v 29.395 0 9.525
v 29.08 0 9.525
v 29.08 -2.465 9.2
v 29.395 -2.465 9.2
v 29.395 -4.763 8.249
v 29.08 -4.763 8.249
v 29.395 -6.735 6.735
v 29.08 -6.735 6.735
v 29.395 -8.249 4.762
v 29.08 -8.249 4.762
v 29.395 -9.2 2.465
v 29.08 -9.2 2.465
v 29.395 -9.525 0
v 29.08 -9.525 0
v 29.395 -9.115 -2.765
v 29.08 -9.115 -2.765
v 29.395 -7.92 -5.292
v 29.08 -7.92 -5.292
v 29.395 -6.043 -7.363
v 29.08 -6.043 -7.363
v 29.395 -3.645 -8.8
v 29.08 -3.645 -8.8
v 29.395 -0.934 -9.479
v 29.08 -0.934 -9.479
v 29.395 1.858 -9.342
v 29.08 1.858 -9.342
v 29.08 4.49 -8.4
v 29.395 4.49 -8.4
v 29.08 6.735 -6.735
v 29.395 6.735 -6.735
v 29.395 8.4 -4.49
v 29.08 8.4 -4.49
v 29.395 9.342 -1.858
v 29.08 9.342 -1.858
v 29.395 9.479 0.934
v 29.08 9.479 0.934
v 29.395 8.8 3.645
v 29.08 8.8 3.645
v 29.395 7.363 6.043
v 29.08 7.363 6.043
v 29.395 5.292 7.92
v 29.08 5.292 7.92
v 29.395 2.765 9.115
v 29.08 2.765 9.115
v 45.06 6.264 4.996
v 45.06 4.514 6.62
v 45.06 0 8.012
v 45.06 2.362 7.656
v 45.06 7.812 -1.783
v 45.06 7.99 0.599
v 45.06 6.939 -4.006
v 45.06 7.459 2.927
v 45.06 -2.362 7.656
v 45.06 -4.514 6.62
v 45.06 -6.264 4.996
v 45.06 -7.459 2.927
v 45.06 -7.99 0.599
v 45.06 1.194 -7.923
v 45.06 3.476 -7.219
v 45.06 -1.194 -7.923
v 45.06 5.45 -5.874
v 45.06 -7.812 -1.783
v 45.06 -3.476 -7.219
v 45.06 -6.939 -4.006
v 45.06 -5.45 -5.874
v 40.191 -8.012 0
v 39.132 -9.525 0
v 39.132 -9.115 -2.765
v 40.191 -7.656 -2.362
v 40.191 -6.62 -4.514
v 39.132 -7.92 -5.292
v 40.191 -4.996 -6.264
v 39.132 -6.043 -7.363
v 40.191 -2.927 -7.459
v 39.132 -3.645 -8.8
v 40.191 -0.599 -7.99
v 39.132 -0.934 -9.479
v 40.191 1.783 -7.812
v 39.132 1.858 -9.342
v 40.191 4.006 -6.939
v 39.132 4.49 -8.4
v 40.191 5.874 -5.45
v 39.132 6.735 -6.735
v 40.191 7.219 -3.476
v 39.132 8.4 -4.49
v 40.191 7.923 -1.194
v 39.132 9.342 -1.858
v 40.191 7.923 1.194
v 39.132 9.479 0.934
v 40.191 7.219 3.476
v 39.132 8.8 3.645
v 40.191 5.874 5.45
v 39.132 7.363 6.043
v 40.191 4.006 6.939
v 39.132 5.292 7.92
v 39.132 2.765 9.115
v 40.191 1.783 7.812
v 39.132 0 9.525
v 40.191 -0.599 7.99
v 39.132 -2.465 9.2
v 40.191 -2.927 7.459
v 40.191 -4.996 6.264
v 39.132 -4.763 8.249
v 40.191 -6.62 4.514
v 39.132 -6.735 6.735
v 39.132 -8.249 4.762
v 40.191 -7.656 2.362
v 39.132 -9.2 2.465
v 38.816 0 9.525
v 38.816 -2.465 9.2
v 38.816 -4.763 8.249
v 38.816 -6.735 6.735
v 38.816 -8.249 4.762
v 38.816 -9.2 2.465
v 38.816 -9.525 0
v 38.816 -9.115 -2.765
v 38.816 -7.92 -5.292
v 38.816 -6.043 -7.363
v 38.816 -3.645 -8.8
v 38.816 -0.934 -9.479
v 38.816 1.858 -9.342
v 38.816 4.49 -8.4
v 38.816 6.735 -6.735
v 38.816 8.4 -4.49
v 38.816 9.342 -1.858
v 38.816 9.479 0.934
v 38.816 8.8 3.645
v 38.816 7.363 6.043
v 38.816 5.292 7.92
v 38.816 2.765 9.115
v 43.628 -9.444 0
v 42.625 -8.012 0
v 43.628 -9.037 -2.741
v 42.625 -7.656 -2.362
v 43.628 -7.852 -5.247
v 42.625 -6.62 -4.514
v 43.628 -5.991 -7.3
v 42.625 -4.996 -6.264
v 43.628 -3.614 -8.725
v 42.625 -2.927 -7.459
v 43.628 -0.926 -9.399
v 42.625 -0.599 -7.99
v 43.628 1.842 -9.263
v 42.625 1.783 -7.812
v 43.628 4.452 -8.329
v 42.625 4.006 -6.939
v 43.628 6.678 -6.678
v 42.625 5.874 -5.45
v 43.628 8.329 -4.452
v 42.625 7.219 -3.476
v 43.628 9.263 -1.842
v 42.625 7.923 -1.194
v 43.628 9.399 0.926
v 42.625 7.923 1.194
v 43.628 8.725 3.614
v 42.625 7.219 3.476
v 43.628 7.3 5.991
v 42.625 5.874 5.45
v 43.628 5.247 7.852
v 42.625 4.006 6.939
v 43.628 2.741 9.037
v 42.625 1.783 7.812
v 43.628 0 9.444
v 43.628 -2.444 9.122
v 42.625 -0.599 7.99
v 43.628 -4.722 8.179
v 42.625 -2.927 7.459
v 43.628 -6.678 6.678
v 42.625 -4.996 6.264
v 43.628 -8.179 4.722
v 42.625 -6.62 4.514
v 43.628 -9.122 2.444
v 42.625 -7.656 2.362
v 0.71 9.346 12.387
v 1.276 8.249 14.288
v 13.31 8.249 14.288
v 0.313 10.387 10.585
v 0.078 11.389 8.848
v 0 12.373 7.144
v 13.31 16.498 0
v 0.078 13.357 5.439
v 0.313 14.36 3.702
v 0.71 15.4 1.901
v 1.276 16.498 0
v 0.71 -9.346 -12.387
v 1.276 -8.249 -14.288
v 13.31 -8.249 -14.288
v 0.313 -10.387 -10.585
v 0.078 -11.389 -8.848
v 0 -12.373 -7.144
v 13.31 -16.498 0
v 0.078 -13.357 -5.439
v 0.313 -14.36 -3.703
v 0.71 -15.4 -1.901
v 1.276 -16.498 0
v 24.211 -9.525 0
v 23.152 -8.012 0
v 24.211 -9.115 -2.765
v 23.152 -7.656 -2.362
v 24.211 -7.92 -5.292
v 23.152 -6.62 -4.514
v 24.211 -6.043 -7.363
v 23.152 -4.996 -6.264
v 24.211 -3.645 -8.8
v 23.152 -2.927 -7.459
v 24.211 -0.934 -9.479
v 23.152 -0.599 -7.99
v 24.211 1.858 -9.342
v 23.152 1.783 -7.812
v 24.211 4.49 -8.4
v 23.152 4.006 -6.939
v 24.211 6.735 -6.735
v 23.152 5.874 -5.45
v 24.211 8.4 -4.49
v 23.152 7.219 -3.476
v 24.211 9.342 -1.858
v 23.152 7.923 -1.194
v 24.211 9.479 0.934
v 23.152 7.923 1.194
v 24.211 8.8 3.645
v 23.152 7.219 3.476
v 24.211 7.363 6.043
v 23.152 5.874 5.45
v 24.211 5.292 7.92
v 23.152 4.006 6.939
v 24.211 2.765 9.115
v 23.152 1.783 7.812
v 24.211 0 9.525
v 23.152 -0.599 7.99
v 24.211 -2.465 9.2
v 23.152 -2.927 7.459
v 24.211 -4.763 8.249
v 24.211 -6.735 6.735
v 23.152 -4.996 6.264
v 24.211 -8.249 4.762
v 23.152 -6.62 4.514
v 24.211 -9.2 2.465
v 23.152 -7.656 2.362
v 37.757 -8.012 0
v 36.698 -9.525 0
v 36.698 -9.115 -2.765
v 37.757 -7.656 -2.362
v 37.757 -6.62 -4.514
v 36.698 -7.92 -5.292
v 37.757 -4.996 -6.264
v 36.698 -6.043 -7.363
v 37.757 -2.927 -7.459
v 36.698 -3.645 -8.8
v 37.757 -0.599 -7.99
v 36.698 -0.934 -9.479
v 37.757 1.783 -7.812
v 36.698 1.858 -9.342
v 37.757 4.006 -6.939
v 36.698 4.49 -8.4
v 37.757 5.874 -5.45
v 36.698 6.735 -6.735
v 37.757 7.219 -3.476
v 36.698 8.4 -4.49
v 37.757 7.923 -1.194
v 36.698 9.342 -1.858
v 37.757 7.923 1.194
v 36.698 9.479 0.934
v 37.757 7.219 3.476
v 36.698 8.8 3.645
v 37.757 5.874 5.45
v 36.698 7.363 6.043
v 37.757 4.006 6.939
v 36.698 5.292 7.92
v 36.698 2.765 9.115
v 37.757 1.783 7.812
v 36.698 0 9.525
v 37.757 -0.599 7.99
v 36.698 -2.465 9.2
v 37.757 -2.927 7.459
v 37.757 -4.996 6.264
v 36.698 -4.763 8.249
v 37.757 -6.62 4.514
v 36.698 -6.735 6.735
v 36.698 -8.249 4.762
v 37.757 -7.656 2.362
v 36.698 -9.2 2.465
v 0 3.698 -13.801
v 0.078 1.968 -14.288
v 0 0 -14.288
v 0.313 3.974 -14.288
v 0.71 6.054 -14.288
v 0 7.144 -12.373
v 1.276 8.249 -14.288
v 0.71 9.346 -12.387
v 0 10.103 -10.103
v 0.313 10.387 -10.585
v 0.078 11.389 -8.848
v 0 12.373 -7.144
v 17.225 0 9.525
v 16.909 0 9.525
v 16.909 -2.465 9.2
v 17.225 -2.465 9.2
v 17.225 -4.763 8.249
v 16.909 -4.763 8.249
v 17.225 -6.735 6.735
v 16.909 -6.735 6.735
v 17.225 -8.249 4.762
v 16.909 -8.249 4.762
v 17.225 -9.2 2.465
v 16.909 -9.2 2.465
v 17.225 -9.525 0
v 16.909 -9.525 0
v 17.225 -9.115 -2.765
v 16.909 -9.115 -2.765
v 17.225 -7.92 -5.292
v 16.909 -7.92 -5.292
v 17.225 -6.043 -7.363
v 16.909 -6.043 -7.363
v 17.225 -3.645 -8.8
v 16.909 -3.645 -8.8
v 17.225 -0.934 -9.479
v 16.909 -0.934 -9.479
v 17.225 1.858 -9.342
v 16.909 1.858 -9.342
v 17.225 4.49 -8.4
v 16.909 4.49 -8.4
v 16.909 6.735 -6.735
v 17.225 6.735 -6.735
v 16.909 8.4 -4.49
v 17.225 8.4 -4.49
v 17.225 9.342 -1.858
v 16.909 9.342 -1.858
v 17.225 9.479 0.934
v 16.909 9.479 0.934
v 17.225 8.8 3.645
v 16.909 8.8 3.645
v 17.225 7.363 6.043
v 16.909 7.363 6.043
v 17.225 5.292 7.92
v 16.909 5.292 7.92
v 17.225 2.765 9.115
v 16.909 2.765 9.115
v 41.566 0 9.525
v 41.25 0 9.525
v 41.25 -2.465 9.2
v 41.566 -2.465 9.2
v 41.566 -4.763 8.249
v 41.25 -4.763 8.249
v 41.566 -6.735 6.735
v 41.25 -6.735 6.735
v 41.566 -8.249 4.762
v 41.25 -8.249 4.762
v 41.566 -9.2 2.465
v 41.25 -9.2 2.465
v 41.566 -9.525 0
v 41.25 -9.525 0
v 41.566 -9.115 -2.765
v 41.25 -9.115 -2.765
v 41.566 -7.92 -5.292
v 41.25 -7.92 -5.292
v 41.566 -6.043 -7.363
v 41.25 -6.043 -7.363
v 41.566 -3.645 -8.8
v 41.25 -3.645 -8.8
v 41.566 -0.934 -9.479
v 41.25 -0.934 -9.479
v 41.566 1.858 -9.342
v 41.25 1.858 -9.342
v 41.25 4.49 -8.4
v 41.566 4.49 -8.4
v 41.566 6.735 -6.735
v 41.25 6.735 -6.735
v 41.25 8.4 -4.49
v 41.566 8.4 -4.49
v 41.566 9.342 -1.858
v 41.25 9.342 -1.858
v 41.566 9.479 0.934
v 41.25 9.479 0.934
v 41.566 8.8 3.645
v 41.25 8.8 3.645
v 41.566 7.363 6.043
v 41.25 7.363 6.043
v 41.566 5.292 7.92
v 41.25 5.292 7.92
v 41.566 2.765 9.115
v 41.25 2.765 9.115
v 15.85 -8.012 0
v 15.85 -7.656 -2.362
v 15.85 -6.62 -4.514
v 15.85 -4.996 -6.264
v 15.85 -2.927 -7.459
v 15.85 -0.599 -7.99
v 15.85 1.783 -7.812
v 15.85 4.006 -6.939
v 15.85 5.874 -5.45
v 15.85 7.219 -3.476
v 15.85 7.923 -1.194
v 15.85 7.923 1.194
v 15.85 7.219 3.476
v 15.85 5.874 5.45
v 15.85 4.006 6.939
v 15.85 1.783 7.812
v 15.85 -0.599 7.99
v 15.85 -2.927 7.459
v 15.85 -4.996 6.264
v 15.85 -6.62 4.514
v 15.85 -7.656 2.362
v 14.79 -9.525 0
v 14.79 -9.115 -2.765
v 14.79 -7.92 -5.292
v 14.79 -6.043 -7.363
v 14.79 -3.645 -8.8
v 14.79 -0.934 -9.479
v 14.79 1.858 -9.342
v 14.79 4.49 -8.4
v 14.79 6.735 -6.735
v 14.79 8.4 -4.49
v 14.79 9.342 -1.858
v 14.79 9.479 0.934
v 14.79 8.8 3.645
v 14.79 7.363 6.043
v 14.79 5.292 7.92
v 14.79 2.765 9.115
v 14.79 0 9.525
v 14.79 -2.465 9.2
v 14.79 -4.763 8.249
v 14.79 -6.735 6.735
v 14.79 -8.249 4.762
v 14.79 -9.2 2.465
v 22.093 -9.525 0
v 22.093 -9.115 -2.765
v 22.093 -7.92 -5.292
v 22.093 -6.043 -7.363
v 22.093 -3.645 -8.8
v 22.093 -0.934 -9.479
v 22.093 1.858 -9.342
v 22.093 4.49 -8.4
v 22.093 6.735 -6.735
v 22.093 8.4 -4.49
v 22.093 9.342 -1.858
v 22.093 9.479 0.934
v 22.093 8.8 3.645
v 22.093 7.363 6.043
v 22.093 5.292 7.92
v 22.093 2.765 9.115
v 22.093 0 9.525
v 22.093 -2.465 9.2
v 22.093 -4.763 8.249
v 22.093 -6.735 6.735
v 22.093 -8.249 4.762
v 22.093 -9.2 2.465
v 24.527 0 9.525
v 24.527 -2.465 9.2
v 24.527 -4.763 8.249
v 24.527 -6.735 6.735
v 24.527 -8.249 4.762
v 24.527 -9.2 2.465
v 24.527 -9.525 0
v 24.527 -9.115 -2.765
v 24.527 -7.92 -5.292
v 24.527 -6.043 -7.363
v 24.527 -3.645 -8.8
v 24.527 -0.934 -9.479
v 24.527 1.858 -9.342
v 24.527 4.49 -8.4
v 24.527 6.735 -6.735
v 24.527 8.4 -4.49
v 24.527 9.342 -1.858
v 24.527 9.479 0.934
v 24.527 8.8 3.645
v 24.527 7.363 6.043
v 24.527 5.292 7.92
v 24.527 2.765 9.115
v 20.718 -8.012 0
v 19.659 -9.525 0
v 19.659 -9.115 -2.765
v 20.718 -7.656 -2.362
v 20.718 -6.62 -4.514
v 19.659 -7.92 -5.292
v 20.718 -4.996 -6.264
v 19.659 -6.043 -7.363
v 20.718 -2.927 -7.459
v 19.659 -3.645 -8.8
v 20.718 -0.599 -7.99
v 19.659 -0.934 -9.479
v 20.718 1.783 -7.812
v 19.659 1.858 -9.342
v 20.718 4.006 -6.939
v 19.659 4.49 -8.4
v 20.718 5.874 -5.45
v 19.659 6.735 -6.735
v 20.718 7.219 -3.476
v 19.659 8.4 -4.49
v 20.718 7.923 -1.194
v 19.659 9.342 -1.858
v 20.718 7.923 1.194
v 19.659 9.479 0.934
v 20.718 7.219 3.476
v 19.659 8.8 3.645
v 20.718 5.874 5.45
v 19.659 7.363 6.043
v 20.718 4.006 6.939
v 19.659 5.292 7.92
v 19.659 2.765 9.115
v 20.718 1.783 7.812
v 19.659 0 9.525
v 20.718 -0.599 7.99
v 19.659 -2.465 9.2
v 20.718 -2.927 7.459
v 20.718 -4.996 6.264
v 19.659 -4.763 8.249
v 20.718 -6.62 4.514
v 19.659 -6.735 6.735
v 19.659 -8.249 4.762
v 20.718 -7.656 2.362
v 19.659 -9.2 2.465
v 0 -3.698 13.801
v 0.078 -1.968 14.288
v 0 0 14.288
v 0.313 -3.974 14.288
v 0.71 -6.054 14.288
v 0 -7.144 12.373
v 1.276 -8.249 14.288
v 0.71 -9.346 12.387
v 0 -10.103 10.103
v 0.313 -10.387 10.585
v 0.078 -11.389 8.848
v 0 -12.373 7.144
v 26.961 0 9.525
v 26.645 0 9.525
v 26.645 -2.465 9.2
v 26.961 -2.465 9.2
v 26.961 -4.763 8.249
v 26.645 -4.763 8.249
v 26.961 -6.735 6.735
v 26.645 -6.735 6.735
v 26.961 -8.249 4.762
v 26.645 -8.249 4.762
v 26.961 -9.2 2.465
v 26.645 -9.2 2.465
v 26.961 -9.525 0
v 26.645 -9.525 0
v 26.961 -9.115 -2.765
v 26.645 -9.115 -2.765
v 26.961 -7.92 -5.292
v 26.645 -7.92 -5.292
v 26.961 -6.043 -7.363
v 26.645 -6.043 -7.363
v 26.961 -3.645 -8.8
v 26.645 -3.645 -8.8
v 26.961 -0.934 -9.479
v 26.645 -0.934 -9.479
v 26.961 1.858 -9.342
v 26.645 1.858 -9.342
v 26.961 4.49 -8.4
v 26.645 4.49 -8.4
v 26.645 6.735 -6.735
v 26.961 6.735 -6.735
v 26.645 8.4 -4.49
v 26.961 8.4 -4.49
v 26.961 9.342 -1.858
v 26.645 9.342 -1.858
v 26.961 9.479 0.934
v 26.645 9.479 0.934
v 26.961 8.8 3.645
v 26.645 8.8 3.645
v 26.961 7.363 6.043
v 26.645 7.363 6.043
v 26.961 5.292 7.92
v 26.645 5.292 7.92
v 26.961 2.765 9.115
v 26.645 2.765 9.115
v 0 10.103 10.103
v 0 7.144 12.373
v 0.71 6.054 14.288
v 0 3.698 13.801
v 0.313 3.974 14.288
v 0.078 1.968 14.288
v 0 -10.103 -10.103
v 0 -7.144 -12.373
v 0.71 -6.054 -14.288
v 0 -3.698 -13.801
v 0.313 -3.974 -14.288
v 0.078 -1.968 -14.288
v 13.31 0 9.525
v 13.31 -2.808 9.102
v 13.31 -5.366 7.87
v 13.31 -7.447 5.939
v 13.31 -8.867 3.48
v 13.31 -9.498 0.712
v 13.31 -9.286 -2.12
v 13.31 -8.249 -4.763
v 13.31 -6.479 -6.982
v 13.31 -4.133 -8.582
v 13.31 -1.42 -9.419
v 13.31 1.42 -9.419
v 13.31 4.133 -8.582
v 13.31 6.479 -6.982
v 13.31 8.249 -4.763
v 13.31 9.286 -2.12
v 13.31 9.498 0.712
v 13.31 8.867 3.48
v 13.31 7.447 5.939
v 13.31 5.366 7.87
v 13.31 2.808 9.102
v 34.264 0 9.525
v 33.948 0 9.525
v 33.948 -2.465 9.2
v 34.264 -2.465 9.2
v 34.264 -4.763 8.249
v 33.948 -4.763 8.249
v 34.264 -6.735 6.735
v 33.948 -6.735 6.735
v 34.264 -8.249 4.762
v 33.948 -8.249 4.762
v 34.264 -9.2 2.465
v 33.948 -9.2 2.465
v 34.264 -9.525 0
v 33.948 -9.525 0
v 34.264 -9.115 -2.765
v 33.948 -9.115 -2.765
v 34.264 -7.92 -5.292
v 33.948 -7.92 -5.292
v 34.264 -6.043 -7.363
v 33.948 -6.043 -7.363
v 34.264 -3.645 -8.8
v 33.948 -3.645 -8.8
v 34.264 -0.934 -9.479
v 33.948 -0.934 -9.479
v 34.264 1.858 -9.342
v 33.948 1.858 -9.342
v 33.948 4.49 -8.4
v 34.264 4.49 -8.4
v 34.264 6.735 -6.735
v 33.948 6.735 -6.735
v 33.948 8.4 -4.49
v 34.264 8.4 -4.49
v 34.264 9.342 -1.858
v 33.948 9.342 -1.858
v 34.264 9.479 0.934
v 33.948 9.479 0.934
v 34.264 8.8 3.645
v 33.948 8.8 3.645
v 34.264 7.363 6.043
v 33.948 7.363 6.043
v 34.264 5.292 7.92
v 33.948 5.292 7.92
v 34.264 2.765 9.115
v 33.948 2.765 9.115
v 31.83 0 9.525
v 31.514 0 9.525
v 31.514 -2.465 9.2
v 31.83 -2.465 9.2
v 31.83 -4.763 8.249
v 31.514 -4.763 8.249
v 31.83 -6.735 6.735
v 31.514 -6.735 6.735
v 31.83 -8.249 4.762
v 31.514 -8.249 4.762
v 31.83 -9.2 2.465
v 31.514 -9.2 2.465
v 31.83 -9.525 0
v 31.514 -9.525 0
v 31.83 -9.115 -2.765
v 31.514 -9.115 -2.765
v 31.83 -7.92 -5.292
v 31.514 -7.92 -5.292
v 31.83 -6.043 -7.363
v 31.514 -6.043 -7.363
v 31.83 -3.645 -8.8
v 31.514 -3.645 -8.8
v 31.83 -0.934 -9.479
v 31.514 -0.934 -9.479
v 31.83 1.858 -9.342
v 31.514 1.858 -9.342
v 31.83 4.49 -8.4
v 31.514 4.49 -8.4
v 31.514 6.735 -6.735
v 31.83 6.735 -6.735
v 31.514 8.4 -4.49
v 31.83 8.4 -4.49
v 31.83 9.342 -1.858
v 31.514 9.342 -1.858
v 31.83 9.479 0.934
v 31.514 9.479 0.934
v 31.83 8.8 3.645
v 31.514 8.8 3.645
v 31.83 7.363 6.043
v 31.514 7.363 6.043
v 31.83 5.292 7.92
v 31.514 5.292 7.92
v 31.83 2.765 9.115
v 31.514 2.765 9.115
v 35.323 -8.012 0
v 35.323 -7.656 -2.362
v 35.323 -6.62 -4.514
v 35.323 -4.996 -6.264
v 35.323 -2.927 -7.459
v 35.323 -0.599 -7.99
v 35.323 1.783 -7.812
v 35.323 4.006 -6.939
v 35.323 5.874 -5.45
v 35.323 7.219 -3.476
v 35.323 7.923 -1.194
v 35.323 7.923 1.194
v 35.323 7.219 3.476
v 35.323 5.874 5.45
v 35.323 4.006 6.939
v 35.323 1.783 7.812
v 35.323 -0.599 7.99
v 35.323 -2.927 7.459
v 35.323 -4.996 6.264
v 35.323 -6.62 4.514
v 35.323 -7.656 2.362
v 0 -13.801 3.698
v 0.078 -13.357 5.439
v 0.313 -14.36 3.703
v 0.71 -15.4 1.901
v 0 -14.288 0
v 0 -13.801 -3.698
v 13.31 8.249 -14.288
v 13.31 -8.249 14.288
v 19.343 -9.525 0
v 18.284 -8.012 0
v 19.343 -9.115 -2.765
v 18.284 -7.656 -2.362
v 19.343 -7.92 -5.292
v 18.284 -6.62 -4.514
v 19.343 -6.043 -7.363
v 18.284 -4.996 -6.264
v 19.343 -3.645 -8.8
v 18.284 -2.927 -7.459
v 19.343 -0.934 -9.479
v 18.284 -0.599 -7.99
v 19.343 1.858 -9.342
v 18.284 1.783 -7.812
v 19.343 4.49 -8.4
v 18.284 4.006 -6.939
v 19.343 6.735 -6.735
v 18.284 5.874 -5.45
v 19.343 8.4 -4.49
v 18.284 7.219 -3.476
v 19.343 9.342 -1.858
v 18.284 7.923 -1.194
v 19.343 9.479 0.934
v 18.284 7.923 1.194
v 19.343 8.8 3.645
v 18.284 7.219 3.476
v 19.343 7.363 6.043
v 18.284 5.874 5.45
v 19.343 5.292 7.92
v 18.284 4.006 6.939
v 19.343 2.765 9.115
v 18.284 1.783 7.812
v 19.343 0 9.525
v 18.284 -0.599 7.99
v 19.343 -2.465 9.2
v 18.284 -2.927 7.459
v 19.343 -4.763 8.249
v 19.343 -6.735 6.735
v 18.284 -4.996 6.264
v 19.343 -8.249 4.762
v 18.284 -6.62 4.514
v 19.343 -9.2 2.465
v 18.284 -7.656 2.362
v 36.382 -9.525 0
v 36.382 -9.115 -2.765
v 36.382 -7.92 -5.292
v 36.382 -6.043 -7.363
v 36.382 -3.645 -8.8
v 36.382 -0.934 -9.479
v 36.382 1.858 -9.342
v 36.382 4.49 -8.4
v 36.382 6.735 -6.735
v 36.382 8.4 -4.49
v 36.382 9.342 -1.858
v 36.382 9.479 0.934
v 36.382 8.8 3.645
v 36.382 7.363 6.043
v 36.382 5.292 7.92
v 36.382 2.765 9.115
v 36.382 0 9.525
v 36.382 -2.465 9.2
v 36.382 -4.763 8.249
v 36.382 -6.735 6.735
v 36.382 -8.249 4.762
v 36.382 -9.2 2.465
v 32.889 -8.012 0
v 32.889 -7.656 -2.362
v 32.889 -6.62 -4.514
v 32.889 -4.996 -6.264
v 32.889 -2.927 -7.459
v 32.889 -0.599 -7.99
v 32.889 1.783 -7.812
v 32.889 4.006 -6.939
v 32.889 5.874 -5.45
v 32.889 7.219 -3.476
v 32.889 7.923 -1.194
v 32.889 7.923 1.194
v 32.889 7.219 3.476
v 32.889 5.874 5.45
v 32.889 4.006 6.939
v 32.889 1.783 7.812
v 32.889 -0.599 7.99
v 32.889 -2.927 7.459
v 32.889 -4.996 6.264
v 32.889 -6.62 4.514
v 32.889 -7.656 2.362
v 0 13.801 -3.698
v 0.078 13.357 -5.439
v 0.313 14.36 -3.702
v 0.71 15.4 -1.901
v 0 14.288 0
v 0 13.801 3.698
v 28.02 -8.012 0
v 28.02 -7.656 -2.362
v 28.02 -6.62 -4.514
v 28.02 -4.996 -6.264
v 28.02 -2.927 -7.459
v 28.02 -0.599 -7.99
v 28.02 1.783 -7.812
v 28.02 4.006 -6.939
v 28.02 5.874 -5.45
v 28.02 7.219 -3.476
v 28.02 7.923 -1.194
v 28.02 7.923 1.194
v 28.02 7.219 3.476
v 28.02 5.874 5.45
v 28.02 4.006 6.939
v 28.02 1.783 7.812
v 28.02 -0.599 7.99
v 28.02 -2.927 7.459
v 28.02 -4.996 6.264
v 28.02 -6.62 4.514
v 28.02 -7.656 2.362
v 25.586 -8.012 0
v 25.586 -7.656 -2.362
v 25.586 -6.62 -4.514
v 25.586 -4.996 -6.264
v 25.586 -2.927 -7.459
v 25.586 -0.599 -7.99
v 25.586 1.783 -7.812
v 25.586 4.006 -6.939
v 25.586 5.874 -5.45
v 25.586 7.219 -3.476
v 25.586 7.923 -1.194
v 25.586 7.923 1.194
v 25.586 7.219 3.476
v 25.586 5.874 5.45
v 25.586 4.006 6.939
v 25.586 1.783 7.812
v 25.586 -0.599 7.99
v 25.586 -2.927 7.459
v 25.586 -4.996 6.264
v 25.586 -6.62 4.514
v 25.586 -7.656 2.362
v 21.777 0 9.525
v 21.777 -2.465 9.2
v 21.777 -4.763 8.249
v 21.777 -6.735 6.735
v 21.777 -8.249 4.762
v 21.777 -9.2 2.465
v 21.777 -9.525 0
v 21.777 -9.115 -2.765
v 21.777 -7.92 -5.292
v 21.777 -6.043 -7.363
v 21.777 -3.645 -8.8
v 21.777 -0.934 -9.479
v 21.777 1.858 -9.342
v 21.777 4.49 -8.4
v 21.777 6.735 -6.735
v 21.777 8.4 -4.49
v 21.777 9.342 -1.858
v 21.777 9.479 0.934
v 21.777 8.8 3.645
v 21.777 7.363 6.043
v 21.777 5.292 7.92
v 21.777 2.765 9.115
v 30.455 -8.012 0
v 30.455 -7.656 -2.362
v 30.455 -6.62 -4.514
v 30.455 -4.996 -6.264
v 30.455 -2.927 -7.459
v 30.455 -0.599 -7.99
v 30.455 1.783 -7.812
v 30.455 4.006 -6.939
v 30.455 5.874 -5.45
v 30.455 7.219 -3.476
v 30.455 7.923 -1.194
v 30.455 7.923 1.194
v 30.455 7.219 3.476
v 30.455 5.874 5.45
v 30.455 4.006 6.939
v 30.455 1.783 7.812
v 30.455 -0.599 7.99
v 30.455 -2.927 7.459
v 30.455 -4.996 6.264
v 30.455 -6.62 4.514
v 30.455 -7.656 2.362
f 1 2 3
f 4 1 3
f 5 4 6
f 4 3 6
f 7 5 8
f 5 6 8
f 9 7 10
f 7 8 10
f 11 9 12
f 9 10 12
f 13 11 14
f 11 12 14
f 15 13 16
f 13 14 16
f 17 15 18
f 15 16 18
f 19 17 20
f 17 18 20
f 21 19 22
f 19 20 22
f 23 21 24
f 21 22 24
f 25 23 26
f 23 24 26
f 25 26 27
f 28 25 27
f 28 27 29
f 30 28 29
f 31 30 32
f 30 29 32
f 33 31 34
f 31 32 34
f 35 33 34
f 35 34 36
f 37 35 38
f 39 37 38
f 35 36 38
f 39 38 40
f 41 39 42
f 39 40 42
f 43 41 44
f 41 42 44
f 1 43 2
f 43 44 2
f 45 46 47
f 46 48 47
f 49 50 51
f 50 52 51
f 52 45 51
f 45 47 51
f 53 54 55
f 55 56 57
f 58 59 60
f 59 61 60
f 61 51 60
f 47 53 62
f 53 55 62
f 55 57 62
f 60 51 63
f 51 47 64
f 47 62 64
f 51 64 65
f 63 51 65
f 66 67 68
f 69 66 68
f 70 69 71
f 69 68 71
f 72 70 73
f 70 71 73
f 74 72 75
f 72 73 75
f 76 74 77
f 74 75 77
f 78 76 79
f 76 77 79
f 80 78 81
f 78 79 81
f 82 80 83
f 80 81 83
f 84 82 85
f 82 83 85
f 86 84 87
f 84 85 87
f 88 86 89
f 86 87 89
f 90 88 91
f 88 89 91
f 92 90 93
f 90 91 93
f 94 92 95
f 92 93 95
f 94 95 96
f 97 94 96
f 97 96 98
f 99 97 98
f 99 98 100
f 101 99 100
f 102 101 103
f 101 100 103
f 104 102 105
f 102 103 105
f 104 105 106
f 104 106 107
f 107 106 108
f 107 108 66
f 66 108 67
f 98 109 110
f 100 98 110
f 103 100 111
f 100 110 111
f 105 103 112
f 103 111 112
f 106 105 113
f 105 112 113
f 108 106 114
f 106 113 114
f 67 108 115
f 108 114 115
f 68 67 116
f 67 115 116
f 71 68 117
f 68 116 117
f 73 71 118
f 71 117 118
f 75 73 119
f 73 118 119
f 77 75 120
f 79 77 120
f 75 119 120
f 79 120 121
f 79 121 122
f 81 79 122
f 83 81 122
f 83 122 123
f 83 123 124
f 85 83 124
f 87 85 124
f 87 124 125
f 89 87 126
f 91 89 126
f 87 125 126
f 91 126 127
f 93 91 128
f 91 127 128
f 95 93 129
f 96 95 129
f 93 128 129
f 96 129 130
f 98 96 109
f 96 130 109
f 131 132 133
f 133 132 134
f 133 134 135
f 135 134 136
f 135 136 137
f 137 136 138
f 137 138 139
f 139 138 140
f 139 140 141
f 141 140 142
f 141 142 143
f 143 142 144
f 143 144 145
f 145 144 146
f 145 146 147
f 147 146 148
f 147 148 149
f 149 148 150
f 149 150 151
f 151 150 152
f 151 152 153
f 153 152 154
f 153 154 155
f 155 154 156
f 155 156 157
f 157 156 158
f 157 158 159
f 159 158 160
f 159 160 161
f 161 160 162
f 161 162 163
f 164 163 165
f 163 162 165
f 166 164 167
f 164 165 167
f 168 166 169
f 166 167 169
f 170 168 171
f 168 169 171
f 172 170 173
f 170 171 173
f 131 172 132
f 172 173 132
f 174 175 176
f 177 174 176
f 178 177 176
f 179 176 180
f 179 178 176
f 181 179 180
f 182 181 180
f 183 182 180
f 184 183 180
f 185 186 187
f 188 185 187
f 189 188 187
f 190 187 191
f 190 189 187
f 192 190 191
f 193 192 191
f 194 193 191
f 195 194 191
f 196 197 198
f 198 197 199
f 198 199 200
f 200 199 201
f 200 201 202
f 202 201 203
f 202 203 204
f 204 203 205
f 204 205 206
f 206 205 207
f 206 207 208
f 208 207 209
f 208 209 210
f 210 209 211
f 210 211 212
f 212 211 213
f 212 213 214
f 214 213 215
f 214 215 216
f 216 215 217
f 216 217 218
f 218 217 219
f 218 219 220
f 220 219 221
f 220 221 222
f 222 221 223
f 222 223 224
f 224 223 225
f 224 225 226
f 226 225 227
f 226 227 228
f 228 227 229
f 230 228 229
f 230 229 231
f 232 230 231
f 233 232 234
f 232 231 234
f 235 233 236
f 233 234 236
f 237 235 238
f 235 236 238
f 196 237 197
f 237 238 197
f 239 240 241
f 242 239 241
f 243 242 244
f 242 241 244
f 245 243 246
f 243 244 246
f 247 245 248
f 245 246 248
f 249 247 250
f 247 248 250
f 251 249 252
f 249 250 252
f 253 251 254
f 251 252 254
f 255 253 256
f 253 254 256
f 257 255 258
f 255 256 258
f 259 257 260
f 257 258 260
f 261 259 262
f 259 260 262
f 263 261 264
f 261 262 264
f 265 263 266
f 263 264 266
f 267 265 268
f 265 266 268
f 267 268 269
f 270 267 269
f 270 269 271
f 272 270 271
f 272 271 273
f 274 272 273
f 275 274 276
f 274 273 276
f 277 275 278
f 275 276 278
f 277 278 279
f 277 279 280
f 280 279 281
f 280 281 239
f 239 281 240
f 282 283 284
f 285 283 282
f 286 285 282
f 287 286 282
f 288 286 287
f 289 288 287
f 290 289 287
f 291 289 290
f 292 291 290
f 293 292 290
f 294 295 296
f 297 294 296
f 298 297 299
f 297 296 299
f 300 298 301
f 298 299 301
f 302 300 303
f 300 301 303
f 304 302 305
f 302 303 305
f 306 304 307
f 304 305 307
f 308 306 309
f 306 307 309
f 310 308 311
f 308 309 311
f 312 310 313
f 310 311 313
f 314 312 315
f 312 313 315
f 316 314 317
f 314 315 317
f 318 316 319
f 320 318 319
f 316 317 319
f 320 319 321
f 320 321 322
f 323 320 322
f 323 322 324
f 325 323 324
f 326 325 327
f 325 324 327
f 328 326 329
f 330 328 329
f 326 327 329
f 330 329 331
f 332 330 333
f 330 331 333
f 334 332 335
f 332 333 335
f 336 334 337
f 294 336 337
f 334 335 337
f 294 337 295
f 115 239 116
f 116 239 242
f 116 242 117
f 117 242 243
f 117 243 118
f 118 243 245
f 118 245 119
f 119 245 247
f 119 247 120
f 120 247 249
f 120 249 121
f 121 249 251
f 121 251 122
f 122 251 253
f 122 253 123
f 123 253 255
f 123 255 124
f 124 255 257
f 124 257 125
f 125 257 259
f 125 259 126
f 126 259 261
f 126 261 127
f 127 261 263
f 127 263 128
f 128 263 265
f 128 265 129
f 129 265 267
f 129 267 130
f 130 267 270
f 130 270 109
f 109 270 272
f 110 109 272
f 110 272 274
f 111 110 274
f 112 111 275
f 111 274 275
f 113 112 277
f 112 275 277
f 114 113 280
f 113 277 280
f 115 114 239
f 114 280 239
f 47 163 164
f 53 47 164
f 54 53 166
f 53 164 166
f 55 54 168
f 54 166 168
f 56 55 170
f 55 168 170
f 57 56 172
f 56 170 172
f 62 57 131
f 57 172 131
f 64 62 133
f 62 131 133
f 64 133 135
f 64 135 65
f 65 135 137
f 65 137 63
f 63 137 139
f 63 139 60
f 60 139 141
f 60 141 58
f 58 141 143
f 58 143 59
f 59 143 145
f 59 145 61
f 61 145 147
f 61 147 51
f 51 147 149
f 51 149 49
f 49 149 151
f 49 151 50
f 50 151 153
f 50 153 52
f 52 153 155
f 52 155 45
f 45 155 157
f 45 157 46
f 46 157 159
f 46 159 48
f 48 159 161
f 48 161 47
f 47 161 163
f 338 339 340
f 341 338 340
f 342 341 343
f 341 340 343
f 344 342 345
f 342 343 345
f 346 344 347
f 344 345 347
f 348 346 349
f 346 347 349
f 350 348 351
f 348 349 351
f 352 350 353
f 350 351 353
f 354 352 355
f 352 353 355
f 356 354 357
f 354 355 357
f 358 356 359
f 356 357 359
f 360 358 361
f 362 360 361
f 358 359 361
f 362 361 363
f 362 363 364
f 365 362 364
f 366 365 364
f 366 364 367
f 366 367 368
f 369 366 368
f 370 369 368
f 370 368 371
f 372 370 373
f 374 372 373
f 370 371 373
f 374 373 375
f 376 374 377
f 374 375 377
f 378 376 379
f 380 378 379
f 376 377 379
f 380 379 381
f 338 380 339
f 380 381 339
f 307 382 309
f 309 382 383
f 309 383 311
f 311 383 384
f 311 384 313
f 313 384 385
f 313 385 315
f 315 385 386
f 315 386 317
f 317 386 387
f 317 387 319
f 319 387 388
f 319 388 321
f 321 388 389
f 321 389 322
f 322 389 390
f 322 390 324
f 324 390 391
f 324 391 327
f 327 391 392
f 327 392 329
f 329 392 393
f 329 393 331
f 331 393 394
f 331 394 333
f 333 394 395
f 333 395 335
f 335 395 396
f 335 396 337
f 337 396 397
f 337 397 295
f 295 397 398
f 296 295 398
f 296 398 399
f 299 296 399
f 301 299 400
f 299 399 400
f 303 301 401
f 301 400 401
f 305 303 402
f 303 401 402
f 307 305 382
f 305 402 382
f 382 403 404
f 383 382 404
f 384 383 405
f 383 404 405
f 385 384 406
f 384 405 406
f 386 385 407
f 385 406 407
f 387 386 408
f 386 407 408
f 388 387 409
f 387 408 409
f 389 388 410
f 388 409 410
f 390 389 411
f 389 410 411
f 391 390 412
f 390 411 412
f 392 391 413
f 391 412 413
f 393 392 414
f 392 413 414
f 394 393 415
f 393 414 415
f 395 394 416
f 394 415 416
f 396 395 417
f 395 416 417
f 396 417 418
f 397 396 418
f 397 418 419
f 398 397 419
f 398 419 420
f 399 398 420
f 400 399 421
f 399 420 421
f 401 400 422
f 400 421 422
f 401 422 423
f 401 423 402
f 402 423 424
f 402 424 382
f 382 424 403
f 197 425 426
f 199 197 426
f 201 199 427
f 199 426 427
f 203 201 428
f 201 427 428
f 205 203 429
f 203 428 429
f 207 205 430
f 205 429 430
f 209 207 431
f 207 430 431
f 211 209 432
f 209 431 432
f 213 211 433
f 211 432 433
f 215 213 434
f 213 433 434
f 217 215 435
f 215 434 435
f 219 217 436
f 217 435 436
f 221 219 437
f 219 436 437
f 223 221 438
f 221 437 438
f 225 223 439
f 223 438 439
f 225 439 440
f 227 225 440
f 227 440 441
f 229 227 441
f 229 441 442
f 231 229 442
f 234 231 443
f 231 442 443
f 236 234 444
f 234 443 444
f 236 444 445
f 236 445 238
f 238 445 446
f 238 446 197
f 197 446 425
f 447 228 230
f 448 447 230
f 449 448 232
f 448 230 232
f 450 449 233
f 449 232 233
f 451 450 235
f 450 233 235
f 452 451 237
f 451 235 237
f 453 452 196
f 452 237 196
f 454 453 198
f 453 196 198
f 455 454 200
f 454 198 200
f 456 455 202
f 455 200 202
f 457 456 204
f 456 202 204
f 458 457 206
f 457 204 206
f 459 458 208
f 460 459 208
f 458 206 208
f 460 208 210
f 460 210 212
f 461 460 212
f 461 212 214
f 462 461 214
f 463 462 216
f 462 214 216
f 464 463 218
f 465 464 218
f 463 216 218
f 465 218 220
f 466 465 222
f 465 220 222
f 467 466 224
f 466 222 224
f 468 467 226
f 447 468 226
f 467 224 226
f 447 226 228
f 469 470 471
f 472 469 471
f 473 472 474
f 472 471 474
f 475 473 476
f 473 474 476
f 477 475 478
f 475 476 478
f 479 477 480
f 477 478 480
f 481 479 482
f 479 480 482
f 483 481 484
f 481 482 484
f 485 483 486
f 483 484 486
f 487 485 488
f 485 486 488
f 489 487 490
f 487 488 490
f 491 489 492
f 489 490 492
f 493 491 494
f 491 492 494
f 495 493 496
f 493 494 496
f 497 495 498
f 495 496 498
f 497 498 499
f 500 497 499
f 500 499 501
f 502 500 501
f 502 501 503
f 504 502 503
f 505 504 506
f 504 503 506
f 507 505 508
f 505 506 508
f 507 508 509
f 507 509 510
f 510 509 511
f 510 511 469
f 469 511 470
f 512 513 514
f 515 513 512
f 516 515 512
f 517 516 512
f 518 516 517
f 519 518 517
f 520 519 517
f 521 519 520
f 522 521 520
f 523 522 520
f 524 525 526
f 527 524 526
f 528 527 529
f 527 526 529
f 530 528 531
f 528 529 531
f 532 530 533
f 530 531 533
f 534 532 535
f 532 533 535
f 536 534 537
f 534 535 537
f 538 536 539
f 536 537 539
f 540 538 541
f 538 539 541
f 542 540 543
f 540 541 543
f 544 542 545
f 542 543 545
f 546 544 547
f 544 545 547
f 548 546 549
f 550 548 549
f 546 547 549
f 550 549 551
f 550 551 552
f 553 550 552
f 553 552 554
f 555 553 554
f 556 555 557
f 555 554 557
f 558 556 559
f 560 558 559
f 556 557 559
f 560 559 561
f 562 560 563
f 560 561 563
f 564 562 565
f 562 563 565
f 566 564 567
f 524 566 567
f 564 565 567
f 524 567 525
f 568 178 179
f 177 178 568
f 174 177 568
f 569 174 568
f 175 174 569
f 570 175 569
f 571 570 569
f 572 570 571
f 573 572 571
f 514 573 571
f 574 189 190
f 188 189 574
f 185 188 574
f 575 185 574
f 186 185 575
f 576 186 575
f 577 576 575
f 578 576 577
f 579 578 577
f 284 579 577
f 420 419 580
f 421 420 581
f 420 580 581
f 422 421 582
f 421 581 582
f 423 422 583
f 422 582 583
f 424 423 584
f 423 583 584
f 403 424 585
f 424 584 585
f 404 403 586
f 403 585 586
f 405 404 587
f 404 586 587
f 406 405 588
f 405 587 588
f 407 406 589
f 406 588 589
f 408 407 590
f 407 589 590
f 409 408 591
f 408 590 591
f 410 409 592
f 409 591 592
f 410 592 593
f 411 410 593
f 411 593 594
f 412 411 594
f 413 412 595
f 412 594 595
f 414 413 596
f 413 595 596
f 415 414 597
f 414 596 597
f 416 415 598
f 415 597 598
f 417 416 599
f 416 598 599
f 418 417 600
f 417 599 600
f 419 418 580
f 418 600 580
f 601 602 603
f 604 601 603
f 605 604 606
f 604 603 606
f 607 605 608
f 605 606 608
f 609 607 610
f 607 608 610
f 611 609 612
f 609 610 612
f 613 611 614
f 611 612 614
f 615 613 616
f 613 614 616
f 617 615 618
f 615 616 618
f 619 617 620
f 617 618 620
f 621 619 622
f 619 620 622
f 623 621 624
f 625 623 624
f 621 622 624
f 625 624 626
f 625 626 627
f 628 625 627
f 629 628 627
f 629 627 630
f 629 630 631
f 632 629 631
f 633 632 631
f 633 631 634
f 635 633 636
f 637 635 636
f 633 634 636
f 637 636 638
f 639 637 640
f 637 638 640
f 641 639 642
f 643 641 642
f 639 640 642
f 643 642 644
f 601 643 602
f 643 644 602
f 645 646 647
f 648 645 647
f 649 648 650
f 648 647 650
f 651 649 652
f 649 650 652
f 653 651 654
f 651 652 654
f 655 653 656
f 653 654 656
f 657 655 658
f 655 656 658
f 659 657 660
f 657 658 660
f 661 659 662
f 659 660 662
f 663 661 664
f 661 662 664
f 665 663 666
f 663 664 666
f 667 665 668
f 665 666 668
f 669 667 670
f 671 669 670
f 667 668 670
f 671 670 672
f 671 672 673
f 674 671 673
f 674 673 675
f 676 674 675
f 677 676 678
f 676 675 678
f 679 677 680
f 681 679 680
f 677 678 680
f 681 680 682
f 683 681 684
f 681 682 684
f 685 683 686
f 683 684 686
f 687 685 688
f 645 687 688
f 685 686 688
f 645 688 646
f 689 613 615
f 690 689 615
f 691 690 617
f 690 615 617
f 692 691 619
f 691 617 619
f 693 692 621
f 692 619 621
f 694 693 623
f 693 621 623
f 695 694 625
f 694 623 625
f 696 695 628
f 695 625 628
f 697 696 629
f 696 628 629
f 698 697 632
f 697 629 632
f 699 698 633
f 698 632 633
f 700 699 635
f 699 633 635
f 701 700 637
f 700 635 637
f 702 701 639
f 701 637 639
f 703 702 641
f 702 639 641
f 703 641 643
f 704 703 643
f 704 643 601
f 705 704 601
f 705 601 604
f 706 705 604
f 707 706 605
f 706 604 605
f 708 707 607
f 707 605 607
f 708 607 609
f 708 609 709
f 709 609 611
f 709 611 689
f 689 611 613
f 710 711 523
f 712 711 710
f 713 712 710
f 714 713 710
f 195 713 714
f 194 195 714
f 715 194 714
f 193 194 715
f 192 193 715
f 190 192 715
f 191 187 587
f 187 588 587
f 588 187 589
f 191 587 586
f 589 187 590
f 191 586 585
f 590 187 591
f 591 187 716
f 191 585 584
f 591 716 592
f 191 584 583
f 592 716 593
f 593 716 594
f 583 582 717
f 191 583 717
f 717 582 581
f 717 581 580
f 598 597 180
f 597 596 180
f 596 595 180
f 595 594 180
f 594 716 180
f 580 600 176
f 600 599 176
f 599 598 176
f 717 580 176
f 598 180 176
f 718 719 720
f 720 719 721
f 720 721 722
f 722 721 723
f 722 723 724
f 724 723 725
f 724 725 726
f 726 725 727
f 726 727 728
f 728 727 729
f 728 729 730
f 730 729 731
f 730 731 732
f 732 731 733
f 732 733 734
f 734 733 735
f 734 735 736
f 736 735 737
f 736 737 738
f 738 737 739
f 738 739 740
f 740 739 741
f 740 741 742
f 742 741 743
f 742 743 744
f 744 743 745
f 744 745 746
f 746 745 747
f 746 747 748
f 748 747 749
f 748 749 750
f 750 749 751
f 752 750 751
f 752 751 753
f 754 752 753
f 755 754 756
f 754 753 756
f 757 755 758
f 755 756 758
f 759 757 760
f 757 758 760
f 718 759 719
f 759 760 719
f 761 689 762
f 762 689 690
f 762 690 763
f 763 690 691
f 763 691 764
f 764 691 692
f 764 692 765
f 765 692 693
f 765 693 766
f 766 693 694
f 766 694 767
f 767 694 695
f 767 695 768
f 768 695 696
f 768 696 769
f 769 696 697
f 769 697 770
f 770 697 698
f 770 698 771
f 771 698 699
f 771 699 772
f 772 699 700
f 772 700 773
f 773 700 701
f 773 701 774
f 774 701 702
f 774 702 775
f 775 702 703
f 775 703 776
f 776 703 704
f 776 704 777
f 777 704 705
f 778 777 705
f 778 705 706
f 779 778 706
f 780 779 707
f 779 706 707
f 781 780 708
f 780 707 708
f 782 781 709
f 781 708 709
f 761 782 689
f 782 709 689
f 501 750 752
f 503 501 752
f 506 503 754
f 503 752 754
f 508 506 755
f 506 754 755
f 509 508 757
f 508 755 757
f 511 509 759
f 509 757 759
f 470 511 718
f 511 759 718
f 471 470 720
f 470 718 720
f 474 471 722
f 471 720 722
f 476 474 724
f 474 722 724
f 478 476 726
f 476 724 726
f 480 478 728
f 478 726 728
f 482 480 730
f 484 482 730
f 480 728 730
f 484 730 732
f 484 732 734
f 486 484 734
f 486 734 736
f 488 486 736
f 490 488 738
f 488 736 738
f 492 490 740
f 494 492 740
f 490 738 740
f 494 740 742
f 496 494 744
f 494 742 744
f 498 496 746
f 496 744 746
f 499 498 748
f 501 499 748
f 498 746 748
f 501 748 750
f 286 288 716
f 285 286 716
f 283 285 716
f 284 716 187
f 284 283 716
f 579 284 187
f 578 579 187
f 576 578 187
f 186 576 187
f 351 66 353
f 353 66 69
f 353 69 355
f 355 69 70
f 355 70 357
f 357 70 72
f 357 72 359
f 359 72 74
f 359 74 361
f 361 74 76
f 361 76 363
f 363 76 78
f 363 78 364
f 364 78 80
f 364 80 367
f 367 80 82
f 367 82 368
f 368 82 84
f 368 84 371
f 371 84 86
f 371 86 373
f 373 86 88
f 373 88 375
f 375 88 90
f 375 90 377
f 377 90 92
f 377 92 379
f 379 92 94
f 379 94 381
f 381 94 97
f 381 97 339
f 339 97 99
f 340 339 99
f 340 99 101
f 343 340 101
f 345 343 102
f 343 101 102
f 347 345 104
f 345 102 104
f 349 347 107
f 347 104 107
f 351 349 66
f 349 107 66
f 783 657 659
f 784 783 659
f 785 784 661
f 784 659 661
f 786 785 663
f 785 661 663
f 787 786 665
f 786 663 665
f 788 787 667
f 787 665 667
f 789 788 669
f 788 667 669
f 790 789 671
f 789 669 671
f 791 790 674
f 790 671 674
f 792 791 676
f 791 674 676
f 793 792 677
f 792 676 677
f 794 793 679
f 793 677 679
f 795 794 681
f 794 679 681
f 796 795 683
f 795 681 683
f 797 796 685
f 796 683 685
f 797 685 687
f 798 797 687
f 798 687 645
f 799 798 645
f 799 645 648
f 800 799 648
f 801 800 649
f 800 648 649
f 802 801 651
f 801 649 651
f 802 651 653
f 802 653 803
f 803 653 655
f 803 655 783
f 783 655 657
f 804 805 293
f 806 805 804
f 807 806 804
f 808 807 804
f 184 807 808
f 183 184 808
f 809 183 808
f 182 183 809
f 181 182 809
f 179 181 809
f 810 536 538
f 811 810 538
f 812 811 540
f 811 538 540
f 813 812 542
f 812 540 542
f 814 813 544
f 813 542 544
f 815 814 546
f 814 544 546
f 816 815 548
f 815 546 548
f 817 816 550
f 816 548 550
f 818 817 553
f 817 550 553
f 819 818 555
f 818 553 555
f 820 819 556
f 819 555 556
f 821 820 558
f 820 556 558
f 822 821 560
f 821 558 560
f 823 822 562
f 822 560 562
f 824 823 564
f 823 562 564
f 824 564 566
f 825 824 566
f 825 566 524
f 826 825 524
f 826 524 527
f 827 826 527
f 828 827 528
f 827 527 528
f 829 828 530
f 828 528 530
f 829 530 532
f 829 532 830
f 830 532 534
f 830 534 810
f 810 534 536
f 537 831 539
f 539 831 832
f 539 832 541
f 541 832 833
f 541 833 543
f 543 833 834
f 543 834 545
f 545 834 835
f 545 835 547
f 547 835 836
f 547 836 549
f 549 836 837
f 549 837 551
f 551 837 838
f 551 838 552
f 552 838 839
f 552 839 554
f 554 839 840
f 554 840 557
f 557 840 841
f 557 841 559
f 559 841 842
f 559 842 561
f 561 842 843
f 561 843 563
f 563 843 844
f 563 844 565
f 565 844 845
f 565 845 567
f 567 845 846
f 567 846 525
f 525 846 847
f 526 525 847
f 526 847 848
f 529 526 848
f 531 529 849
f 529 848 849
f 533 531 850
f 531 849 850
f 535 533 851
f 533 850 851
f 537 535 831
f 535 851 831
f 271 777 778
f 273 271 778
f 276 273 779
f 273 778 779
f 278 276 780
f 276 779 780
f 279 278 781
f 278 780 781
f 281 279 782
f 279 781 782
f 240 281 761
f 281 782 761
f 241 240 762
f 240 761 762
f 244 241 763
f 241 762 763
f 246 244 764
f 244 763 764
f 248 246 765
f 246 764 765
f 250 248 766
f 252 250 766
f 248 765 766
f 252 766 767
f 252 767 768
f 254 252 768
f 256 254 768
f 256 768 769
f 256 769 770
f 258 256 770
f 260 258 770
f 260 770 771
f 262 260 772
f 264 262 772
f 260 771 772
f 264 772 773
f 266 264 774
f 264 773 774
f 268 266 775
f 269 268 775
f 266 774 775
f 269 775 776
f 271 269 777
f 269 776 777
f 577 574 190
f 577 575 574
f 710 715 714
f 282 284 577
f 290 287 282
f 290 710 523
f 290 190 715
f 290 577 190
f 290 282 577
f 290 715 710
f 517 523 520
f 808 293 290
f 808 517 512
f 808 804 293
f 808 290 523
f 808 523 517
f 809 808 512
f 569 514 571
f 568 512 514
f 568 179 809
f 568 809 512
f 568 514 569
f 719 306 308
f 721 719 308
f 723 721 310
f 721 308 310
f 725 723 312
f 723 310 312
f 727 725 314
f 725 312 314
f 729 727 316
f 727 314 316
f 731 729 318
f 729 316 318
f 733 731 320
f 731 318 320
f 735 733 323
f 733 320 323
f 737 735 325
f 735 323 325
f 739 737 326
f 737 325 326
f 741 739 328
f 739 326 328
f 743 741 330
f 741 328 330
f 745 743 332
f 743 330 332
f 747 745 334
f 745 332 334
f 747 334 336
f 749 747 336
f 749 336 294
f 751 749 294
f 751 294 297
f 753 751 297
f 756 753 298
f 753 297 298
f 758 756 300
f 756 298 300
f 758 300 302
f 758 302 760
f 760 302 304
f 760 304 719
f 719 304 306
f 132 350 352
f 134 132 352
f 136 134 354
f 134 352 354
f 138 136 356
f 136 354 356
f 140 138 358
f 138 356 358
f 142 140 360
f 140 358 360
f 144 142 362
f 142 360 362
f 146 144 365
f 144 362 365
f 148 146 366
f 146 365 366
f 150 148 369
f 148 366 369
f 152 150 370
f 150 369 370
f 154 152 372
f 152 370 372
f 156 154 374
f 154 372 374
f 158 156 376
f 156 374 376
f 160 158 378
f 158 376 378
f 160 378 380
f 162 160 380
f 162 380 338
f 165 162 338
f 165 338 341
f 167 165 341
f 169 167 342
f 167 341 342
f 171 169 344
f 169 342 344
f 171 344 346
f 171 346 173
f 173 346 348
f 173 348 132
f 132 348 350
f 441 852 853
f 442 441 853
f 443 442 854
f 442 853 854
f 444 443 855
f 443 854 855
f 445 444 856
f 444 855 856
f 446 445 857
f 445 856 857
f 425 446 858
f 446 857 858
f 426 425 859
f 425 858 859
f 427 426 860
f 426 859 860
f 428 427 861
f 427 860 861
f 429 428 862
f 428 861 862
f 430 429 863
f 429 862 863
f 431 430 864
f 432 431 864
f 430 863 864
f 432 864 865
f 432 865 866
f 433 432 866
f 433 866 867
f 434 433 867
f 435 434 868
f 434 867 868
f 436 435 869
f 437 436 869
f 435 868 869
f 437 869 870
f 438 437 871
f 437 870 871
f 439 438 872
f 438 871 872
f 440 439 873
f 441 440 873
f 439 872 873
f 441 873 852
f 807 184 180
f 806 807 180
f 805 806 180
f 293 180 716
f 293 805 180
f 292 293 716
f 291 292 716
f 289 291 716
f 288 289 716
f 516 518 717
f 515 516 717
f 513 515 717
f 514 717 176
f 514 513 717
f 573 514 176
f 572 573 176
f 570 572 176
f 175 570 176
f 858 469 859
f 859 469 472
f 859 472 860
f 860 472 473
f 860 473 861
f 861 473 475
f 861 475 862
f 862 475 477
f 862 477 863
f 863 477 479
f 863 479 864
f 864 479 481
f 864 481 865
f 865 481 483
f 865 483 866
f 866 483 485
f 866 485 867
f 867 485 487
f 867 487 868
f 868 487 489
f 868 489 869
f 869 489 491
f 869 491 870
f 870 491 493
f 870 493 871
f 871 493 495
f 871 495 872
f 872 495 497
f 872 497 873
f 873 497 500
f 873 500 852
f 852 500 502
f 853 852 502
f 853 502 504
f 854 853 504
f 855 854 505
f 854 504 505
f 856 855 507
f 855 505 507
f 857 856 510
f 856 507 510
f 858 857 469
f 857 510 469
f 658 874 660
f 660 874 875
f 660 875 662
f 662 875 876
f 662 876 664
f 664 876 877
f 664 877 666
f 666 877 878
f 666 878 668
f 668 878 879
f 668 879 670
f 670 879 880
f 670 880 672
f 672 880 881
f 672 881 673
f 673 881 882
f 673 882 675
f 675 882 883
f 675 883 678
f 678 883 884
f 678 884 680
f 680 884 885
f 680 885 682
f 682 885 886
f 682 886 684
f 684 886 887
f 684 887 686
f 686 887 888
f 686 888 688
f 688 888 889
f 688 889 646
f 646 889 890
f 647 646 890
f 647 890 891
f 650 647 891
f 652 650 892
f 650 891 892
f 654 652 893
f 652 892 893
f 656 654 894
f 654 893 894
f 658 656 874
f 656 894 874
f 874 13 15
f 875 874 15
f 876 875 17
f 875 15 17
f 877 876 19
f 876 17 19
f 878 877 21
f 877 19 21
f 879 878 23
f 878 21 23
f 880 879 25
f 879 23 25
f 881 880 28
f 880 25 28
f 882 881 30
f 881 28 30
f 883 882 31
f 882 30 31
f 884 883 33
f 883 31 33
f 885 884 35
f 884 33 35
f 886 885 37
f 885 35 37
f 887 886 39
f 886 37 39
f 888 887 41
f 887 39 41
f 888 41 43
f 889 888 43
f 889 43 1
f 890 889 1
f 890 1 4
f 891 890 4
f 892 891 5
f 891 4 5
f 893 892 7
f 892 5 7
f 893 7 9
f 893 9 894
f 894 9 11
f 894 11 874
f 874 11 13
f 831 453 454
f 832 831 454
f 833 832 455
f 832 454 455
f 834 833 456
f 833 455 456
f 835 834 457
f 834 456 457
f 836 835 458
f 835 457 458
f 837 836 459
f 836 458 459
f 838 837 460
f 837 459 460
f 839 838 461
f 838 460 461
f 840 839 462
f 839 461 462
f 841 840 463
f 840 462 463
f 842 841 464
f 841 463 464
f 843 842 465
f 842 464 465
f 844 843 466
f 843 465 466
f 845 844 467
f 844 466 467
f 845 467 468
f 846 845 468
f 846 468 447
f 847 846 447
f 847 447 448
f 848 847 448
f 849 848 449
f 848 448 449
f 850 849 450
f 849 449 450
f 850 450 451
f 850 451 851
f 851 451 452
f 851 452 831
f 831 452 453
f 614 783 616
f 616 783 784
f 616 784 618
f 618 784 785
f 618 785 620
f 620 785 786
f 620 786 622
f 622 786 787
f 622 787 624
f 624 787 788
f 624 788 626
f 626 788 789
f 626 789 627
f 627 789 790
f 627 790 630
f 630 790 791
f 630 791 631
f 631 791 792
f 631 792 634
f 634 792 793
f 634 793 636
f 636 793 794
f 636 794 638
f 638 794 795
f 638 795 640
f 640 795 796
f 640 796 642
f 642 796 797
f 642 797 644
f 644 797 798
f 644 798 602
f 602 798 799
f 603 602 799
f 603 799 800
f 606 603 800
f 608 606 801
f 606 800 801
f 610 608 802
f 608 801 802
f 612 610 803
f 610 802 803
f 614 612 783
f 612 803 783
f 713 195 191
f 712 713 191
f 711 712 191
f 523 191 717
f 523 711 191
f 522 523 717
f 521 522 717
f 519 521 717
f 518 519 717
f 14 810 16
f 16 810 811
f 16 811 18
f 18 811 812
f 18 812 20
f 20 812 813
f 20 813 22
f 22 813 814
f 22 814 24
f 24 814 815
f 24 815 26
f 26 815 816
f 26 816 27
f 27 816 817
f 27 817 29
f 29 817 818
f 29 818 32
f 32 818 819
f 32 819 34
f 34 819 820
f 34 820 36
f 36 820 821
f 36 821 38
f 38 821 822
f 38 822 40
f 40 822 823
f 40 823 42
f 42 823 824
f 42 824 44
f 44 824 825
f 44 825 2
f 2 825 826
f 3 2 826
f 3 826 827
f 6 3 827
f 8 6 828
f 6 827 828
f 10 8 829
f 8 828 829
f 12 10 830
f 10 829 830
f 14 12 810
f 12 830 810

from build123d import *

# Parameters (mm, degrees)
BASEHEAD_DEPTH  = 13.3096
THDSCHPAT_COUNT = 12
THDSCHPAT_PITCH = 2.434166667


with BuildPart() as part:
    # Sketch1 → BaseHead (new body)
    with BuildSketch(Plane(origin=(0, 0, 0), x_dir=(0, 0, -1), z_dir=(1, 0, 0))):
        Polygon((14.2875, 8.248891971), (14.2875, -8.248891971), (0, -16.497783942), (-14.2875, -8.248891971), (-14.2875, 8.248891971), (0, 16.497783942), align=None)
    extrude(amount=BASEHEAD_DEPTH)

    # BodySke → BaseBody (revolve)
    with BuildSketch(Plane.XY, mode=Mode.PRIVATE) as basebody_sk:
        Polygon((0, 0), (45.0596, 0), (45.0596, 8.01243), (43.54703, 9.525), (0, 9.525), align=None)
    revolve(basebody_sk.sketch.rotate(Axis((0, 0, 0), (1, 0, 0)), 90), axis=Axis((0, 0, 0), (1, 0, 0)))

    # Sketch3 → HeadChamfer (revolve, cut)
    with BuildSketch(Plane.XY):
        Polygon((0, 14.2875), (4.942282238, 22.847783942), (4.942282238, 29.197783942), (-12.7, 29.197783942), (-12.7, 14.2875), align=None)
    revolve(axis=Axis((0, 0, 0), (1, 0, 0)), mode=Mode.SUBTRACT)

    # ThdSchSke → ThreadSchematic (revolve, cut)
    with BuildSketch(Plane.XY):
        Polygon((15.8496, -8.01243), (14.790487084, -9.525), (14.790487084, -11.90625), (16.908712916, -11.90625), (16.908712916, -9.525), align=None)
    threadschematic = revolve(axis=Axis((-3.175, 0, 0), (1, 0, 0)), mode=Mode.SUBTRACT)

    # ThdSchPat: ThreadSchematic ×12
    with Locations(*[(i * THDSCHPAT_PITCH, 0, 0) for i in range(1, THDSCHPAT_COUNT)]):
        add(threadschematic, mode=Mode.SUBTRACT)


solid = part.part
